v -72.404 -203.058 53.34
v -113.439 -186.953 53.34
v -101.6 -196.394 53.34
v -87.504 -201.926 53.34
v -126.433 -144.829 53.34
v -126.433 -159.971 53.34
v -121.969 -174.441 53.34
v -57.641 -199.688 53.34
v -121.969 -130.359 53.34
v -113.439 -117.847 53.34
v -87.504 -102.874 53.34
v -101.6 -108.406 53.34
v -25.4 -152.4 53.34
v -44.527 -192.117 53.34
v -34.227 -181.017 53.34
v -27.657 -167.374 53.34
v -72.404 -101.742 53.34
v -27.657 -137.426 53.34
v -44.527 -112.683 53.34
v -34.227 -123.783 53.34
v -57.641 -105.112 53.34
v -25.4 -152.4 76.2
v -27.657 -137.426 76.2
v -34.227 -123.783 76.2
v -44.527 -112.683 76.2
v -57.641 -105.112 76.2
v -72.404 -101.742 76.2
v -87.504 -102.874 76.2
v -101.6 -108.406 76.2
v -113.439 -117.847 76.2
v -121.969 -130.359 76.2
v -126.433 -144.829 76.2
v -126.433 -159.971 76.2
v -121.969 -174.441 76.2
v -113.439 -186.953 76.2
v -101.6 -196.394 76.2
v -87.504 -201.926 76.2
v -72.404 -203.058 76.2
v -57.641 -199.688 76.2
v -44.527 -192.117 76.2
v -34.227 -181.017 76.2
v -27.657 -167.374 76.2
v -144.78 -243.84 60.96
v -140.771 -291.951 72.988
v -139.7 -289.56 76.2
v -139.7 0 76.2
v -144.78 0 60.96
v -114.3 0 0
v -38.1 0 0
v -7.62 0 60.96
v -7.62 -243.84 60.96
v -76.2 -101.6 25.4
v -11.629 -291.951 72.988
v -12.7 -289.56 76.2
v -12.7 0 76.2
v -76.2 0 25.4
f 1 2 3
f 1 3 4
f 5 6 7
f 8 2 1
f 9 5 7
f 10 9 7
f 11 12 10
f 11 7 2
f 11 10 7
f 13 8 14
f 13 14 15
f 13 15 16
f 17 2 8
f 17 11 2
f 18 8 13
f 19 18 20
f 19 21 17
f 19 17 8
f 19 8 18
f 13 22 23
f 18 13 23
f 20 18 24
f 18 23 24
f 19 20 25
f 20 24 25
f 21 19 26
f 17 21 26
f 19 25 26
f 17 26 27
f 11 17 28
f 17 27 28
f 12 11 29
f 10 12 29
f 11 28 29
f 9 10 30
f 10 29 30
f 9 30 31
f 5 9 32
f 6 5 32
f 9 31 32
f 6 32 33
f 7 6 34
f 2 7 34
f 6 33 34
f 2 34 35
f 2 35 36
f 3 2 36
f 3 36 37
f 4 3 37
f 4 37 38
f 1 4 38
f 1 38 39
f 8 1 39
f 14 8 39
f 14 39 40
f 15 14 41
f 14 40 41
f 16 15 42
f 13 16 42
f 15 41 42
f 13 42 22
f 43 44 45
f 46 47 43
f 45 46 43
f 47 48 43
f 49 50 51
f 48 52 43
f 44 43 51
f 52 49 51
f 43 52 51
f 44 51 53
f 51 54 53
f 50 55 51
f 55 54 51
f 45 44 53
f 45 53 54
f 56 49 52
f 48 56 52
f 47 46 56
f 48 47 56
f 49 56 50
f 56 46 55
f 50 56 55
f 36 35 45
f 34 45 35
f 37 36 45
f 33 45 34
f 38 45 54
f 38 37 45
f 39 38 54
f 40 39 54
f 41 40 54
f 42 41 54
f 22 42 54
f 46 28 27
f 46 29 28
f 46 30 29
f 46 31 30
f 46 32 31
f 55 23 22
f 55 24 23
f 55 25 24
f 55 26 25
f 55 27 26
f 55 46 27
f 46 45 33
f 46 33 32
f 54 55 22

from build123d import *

# Parameters (mm, degrees)
F0_W      = 152.4
F0_H      = 76.2
F1_DEPTH  = 304.8
F3_DEPTH  = 304.8
F5_DEPTH  = 304.8
F7_DEPTH  = 304.8
F9_DEPTH  = 304.8
F11_DEPTH = 304.8
F13_DEPTH = 304.8
F15_DEPTH = 304.8
F16_R     = 50.8
F17_DEPTH = 22.86


with BuildPart() as f1:
    # F0 (on Front) → F1 (new body)
    with BuildSketch(Plane.XZ):
        with Locations((-76.2, 38.1)):
            Rectangle(F0_W, F0_H)
    extrude(amount=F1_DEPTH)

    # F2 (on Right) → F3 (cut)
    with BuildSketch(Plane.YZ):
        Polygon((-304.8, 0), (0, 0), (-304.8, 76.2), align=None)
    extrude(amount=-F3_DEPTH, mode=Mode.SUBTRACT)

    # F4 (on Front) → F5 (cut)
    with BuildSketch(Plane.XZ):
        Polygon((-38.1, 0), (0, 0), (0, 76.2), align=None)
    extrude(amount=F5_DEPTH, mode=Mode.SUBTRACT)

    # F6 (on Front) → F7 (cut)
    with BuildSketch(Plane.XZ):
        Polygon((-152.4, 0), (-114.3, 0), (-152.4, 76.2), align=None)
    extrude(amount=F7_DEPTH, mode=Mode.SUBTRACT)

    # F8 (on Right) → F9 (cut)
    with BuildSketch(Plane.YZ):
        Polygon((-304.8, 76.2), (-304.8, 55.721472), (-289.56, 76.2), align=None)
    extrude(amount=-F9_DEPTH, mode=Mode.SUBTRACT)

    # F10 (on Front) → F11 (cut)
    with BuildSketch(Plane.XZ):
        Polygon((-12.7, 76.2), (0, 38.1), (0, 76.2), align=None)
    extrude(amount=F11_DEPTH, mode=Mode.SUBTRACT)

    # F12 (on Front) → F13 (cut)
    with BuildSketch(Plane.XZ):
        Polygon((-152.4, 76.2), (-152.4, 38.1), (-139.7, 76.2), align=None)
    extrude(amount=F13_DEPTH, mode=Mode.SUBTRACT)

    # F14 (on Front) → F15 (cut)
    with BuildSketch(Plane.XZ):
        Polygon((-76.2, 0), (-38.1, 0), (-76.2, 25.4), align=None)
        Polygon((-114.3, 0), (-76.2, 0), (-76.2, 25.4), align=None)
    extrude(amount=F15_DEPTH, mode=Mode.SUBTRACT)

    # F16 (on face) → F17 (cut)
    with BuildSketch(Plane.XY.offset(76.2)):
        with Locations((-76.2, -152.4)):
            Circle(F16_R)
    extrude(amount=-F17_DEPTH, mode=Mode.SUBTRACT)


solid = f1.part
